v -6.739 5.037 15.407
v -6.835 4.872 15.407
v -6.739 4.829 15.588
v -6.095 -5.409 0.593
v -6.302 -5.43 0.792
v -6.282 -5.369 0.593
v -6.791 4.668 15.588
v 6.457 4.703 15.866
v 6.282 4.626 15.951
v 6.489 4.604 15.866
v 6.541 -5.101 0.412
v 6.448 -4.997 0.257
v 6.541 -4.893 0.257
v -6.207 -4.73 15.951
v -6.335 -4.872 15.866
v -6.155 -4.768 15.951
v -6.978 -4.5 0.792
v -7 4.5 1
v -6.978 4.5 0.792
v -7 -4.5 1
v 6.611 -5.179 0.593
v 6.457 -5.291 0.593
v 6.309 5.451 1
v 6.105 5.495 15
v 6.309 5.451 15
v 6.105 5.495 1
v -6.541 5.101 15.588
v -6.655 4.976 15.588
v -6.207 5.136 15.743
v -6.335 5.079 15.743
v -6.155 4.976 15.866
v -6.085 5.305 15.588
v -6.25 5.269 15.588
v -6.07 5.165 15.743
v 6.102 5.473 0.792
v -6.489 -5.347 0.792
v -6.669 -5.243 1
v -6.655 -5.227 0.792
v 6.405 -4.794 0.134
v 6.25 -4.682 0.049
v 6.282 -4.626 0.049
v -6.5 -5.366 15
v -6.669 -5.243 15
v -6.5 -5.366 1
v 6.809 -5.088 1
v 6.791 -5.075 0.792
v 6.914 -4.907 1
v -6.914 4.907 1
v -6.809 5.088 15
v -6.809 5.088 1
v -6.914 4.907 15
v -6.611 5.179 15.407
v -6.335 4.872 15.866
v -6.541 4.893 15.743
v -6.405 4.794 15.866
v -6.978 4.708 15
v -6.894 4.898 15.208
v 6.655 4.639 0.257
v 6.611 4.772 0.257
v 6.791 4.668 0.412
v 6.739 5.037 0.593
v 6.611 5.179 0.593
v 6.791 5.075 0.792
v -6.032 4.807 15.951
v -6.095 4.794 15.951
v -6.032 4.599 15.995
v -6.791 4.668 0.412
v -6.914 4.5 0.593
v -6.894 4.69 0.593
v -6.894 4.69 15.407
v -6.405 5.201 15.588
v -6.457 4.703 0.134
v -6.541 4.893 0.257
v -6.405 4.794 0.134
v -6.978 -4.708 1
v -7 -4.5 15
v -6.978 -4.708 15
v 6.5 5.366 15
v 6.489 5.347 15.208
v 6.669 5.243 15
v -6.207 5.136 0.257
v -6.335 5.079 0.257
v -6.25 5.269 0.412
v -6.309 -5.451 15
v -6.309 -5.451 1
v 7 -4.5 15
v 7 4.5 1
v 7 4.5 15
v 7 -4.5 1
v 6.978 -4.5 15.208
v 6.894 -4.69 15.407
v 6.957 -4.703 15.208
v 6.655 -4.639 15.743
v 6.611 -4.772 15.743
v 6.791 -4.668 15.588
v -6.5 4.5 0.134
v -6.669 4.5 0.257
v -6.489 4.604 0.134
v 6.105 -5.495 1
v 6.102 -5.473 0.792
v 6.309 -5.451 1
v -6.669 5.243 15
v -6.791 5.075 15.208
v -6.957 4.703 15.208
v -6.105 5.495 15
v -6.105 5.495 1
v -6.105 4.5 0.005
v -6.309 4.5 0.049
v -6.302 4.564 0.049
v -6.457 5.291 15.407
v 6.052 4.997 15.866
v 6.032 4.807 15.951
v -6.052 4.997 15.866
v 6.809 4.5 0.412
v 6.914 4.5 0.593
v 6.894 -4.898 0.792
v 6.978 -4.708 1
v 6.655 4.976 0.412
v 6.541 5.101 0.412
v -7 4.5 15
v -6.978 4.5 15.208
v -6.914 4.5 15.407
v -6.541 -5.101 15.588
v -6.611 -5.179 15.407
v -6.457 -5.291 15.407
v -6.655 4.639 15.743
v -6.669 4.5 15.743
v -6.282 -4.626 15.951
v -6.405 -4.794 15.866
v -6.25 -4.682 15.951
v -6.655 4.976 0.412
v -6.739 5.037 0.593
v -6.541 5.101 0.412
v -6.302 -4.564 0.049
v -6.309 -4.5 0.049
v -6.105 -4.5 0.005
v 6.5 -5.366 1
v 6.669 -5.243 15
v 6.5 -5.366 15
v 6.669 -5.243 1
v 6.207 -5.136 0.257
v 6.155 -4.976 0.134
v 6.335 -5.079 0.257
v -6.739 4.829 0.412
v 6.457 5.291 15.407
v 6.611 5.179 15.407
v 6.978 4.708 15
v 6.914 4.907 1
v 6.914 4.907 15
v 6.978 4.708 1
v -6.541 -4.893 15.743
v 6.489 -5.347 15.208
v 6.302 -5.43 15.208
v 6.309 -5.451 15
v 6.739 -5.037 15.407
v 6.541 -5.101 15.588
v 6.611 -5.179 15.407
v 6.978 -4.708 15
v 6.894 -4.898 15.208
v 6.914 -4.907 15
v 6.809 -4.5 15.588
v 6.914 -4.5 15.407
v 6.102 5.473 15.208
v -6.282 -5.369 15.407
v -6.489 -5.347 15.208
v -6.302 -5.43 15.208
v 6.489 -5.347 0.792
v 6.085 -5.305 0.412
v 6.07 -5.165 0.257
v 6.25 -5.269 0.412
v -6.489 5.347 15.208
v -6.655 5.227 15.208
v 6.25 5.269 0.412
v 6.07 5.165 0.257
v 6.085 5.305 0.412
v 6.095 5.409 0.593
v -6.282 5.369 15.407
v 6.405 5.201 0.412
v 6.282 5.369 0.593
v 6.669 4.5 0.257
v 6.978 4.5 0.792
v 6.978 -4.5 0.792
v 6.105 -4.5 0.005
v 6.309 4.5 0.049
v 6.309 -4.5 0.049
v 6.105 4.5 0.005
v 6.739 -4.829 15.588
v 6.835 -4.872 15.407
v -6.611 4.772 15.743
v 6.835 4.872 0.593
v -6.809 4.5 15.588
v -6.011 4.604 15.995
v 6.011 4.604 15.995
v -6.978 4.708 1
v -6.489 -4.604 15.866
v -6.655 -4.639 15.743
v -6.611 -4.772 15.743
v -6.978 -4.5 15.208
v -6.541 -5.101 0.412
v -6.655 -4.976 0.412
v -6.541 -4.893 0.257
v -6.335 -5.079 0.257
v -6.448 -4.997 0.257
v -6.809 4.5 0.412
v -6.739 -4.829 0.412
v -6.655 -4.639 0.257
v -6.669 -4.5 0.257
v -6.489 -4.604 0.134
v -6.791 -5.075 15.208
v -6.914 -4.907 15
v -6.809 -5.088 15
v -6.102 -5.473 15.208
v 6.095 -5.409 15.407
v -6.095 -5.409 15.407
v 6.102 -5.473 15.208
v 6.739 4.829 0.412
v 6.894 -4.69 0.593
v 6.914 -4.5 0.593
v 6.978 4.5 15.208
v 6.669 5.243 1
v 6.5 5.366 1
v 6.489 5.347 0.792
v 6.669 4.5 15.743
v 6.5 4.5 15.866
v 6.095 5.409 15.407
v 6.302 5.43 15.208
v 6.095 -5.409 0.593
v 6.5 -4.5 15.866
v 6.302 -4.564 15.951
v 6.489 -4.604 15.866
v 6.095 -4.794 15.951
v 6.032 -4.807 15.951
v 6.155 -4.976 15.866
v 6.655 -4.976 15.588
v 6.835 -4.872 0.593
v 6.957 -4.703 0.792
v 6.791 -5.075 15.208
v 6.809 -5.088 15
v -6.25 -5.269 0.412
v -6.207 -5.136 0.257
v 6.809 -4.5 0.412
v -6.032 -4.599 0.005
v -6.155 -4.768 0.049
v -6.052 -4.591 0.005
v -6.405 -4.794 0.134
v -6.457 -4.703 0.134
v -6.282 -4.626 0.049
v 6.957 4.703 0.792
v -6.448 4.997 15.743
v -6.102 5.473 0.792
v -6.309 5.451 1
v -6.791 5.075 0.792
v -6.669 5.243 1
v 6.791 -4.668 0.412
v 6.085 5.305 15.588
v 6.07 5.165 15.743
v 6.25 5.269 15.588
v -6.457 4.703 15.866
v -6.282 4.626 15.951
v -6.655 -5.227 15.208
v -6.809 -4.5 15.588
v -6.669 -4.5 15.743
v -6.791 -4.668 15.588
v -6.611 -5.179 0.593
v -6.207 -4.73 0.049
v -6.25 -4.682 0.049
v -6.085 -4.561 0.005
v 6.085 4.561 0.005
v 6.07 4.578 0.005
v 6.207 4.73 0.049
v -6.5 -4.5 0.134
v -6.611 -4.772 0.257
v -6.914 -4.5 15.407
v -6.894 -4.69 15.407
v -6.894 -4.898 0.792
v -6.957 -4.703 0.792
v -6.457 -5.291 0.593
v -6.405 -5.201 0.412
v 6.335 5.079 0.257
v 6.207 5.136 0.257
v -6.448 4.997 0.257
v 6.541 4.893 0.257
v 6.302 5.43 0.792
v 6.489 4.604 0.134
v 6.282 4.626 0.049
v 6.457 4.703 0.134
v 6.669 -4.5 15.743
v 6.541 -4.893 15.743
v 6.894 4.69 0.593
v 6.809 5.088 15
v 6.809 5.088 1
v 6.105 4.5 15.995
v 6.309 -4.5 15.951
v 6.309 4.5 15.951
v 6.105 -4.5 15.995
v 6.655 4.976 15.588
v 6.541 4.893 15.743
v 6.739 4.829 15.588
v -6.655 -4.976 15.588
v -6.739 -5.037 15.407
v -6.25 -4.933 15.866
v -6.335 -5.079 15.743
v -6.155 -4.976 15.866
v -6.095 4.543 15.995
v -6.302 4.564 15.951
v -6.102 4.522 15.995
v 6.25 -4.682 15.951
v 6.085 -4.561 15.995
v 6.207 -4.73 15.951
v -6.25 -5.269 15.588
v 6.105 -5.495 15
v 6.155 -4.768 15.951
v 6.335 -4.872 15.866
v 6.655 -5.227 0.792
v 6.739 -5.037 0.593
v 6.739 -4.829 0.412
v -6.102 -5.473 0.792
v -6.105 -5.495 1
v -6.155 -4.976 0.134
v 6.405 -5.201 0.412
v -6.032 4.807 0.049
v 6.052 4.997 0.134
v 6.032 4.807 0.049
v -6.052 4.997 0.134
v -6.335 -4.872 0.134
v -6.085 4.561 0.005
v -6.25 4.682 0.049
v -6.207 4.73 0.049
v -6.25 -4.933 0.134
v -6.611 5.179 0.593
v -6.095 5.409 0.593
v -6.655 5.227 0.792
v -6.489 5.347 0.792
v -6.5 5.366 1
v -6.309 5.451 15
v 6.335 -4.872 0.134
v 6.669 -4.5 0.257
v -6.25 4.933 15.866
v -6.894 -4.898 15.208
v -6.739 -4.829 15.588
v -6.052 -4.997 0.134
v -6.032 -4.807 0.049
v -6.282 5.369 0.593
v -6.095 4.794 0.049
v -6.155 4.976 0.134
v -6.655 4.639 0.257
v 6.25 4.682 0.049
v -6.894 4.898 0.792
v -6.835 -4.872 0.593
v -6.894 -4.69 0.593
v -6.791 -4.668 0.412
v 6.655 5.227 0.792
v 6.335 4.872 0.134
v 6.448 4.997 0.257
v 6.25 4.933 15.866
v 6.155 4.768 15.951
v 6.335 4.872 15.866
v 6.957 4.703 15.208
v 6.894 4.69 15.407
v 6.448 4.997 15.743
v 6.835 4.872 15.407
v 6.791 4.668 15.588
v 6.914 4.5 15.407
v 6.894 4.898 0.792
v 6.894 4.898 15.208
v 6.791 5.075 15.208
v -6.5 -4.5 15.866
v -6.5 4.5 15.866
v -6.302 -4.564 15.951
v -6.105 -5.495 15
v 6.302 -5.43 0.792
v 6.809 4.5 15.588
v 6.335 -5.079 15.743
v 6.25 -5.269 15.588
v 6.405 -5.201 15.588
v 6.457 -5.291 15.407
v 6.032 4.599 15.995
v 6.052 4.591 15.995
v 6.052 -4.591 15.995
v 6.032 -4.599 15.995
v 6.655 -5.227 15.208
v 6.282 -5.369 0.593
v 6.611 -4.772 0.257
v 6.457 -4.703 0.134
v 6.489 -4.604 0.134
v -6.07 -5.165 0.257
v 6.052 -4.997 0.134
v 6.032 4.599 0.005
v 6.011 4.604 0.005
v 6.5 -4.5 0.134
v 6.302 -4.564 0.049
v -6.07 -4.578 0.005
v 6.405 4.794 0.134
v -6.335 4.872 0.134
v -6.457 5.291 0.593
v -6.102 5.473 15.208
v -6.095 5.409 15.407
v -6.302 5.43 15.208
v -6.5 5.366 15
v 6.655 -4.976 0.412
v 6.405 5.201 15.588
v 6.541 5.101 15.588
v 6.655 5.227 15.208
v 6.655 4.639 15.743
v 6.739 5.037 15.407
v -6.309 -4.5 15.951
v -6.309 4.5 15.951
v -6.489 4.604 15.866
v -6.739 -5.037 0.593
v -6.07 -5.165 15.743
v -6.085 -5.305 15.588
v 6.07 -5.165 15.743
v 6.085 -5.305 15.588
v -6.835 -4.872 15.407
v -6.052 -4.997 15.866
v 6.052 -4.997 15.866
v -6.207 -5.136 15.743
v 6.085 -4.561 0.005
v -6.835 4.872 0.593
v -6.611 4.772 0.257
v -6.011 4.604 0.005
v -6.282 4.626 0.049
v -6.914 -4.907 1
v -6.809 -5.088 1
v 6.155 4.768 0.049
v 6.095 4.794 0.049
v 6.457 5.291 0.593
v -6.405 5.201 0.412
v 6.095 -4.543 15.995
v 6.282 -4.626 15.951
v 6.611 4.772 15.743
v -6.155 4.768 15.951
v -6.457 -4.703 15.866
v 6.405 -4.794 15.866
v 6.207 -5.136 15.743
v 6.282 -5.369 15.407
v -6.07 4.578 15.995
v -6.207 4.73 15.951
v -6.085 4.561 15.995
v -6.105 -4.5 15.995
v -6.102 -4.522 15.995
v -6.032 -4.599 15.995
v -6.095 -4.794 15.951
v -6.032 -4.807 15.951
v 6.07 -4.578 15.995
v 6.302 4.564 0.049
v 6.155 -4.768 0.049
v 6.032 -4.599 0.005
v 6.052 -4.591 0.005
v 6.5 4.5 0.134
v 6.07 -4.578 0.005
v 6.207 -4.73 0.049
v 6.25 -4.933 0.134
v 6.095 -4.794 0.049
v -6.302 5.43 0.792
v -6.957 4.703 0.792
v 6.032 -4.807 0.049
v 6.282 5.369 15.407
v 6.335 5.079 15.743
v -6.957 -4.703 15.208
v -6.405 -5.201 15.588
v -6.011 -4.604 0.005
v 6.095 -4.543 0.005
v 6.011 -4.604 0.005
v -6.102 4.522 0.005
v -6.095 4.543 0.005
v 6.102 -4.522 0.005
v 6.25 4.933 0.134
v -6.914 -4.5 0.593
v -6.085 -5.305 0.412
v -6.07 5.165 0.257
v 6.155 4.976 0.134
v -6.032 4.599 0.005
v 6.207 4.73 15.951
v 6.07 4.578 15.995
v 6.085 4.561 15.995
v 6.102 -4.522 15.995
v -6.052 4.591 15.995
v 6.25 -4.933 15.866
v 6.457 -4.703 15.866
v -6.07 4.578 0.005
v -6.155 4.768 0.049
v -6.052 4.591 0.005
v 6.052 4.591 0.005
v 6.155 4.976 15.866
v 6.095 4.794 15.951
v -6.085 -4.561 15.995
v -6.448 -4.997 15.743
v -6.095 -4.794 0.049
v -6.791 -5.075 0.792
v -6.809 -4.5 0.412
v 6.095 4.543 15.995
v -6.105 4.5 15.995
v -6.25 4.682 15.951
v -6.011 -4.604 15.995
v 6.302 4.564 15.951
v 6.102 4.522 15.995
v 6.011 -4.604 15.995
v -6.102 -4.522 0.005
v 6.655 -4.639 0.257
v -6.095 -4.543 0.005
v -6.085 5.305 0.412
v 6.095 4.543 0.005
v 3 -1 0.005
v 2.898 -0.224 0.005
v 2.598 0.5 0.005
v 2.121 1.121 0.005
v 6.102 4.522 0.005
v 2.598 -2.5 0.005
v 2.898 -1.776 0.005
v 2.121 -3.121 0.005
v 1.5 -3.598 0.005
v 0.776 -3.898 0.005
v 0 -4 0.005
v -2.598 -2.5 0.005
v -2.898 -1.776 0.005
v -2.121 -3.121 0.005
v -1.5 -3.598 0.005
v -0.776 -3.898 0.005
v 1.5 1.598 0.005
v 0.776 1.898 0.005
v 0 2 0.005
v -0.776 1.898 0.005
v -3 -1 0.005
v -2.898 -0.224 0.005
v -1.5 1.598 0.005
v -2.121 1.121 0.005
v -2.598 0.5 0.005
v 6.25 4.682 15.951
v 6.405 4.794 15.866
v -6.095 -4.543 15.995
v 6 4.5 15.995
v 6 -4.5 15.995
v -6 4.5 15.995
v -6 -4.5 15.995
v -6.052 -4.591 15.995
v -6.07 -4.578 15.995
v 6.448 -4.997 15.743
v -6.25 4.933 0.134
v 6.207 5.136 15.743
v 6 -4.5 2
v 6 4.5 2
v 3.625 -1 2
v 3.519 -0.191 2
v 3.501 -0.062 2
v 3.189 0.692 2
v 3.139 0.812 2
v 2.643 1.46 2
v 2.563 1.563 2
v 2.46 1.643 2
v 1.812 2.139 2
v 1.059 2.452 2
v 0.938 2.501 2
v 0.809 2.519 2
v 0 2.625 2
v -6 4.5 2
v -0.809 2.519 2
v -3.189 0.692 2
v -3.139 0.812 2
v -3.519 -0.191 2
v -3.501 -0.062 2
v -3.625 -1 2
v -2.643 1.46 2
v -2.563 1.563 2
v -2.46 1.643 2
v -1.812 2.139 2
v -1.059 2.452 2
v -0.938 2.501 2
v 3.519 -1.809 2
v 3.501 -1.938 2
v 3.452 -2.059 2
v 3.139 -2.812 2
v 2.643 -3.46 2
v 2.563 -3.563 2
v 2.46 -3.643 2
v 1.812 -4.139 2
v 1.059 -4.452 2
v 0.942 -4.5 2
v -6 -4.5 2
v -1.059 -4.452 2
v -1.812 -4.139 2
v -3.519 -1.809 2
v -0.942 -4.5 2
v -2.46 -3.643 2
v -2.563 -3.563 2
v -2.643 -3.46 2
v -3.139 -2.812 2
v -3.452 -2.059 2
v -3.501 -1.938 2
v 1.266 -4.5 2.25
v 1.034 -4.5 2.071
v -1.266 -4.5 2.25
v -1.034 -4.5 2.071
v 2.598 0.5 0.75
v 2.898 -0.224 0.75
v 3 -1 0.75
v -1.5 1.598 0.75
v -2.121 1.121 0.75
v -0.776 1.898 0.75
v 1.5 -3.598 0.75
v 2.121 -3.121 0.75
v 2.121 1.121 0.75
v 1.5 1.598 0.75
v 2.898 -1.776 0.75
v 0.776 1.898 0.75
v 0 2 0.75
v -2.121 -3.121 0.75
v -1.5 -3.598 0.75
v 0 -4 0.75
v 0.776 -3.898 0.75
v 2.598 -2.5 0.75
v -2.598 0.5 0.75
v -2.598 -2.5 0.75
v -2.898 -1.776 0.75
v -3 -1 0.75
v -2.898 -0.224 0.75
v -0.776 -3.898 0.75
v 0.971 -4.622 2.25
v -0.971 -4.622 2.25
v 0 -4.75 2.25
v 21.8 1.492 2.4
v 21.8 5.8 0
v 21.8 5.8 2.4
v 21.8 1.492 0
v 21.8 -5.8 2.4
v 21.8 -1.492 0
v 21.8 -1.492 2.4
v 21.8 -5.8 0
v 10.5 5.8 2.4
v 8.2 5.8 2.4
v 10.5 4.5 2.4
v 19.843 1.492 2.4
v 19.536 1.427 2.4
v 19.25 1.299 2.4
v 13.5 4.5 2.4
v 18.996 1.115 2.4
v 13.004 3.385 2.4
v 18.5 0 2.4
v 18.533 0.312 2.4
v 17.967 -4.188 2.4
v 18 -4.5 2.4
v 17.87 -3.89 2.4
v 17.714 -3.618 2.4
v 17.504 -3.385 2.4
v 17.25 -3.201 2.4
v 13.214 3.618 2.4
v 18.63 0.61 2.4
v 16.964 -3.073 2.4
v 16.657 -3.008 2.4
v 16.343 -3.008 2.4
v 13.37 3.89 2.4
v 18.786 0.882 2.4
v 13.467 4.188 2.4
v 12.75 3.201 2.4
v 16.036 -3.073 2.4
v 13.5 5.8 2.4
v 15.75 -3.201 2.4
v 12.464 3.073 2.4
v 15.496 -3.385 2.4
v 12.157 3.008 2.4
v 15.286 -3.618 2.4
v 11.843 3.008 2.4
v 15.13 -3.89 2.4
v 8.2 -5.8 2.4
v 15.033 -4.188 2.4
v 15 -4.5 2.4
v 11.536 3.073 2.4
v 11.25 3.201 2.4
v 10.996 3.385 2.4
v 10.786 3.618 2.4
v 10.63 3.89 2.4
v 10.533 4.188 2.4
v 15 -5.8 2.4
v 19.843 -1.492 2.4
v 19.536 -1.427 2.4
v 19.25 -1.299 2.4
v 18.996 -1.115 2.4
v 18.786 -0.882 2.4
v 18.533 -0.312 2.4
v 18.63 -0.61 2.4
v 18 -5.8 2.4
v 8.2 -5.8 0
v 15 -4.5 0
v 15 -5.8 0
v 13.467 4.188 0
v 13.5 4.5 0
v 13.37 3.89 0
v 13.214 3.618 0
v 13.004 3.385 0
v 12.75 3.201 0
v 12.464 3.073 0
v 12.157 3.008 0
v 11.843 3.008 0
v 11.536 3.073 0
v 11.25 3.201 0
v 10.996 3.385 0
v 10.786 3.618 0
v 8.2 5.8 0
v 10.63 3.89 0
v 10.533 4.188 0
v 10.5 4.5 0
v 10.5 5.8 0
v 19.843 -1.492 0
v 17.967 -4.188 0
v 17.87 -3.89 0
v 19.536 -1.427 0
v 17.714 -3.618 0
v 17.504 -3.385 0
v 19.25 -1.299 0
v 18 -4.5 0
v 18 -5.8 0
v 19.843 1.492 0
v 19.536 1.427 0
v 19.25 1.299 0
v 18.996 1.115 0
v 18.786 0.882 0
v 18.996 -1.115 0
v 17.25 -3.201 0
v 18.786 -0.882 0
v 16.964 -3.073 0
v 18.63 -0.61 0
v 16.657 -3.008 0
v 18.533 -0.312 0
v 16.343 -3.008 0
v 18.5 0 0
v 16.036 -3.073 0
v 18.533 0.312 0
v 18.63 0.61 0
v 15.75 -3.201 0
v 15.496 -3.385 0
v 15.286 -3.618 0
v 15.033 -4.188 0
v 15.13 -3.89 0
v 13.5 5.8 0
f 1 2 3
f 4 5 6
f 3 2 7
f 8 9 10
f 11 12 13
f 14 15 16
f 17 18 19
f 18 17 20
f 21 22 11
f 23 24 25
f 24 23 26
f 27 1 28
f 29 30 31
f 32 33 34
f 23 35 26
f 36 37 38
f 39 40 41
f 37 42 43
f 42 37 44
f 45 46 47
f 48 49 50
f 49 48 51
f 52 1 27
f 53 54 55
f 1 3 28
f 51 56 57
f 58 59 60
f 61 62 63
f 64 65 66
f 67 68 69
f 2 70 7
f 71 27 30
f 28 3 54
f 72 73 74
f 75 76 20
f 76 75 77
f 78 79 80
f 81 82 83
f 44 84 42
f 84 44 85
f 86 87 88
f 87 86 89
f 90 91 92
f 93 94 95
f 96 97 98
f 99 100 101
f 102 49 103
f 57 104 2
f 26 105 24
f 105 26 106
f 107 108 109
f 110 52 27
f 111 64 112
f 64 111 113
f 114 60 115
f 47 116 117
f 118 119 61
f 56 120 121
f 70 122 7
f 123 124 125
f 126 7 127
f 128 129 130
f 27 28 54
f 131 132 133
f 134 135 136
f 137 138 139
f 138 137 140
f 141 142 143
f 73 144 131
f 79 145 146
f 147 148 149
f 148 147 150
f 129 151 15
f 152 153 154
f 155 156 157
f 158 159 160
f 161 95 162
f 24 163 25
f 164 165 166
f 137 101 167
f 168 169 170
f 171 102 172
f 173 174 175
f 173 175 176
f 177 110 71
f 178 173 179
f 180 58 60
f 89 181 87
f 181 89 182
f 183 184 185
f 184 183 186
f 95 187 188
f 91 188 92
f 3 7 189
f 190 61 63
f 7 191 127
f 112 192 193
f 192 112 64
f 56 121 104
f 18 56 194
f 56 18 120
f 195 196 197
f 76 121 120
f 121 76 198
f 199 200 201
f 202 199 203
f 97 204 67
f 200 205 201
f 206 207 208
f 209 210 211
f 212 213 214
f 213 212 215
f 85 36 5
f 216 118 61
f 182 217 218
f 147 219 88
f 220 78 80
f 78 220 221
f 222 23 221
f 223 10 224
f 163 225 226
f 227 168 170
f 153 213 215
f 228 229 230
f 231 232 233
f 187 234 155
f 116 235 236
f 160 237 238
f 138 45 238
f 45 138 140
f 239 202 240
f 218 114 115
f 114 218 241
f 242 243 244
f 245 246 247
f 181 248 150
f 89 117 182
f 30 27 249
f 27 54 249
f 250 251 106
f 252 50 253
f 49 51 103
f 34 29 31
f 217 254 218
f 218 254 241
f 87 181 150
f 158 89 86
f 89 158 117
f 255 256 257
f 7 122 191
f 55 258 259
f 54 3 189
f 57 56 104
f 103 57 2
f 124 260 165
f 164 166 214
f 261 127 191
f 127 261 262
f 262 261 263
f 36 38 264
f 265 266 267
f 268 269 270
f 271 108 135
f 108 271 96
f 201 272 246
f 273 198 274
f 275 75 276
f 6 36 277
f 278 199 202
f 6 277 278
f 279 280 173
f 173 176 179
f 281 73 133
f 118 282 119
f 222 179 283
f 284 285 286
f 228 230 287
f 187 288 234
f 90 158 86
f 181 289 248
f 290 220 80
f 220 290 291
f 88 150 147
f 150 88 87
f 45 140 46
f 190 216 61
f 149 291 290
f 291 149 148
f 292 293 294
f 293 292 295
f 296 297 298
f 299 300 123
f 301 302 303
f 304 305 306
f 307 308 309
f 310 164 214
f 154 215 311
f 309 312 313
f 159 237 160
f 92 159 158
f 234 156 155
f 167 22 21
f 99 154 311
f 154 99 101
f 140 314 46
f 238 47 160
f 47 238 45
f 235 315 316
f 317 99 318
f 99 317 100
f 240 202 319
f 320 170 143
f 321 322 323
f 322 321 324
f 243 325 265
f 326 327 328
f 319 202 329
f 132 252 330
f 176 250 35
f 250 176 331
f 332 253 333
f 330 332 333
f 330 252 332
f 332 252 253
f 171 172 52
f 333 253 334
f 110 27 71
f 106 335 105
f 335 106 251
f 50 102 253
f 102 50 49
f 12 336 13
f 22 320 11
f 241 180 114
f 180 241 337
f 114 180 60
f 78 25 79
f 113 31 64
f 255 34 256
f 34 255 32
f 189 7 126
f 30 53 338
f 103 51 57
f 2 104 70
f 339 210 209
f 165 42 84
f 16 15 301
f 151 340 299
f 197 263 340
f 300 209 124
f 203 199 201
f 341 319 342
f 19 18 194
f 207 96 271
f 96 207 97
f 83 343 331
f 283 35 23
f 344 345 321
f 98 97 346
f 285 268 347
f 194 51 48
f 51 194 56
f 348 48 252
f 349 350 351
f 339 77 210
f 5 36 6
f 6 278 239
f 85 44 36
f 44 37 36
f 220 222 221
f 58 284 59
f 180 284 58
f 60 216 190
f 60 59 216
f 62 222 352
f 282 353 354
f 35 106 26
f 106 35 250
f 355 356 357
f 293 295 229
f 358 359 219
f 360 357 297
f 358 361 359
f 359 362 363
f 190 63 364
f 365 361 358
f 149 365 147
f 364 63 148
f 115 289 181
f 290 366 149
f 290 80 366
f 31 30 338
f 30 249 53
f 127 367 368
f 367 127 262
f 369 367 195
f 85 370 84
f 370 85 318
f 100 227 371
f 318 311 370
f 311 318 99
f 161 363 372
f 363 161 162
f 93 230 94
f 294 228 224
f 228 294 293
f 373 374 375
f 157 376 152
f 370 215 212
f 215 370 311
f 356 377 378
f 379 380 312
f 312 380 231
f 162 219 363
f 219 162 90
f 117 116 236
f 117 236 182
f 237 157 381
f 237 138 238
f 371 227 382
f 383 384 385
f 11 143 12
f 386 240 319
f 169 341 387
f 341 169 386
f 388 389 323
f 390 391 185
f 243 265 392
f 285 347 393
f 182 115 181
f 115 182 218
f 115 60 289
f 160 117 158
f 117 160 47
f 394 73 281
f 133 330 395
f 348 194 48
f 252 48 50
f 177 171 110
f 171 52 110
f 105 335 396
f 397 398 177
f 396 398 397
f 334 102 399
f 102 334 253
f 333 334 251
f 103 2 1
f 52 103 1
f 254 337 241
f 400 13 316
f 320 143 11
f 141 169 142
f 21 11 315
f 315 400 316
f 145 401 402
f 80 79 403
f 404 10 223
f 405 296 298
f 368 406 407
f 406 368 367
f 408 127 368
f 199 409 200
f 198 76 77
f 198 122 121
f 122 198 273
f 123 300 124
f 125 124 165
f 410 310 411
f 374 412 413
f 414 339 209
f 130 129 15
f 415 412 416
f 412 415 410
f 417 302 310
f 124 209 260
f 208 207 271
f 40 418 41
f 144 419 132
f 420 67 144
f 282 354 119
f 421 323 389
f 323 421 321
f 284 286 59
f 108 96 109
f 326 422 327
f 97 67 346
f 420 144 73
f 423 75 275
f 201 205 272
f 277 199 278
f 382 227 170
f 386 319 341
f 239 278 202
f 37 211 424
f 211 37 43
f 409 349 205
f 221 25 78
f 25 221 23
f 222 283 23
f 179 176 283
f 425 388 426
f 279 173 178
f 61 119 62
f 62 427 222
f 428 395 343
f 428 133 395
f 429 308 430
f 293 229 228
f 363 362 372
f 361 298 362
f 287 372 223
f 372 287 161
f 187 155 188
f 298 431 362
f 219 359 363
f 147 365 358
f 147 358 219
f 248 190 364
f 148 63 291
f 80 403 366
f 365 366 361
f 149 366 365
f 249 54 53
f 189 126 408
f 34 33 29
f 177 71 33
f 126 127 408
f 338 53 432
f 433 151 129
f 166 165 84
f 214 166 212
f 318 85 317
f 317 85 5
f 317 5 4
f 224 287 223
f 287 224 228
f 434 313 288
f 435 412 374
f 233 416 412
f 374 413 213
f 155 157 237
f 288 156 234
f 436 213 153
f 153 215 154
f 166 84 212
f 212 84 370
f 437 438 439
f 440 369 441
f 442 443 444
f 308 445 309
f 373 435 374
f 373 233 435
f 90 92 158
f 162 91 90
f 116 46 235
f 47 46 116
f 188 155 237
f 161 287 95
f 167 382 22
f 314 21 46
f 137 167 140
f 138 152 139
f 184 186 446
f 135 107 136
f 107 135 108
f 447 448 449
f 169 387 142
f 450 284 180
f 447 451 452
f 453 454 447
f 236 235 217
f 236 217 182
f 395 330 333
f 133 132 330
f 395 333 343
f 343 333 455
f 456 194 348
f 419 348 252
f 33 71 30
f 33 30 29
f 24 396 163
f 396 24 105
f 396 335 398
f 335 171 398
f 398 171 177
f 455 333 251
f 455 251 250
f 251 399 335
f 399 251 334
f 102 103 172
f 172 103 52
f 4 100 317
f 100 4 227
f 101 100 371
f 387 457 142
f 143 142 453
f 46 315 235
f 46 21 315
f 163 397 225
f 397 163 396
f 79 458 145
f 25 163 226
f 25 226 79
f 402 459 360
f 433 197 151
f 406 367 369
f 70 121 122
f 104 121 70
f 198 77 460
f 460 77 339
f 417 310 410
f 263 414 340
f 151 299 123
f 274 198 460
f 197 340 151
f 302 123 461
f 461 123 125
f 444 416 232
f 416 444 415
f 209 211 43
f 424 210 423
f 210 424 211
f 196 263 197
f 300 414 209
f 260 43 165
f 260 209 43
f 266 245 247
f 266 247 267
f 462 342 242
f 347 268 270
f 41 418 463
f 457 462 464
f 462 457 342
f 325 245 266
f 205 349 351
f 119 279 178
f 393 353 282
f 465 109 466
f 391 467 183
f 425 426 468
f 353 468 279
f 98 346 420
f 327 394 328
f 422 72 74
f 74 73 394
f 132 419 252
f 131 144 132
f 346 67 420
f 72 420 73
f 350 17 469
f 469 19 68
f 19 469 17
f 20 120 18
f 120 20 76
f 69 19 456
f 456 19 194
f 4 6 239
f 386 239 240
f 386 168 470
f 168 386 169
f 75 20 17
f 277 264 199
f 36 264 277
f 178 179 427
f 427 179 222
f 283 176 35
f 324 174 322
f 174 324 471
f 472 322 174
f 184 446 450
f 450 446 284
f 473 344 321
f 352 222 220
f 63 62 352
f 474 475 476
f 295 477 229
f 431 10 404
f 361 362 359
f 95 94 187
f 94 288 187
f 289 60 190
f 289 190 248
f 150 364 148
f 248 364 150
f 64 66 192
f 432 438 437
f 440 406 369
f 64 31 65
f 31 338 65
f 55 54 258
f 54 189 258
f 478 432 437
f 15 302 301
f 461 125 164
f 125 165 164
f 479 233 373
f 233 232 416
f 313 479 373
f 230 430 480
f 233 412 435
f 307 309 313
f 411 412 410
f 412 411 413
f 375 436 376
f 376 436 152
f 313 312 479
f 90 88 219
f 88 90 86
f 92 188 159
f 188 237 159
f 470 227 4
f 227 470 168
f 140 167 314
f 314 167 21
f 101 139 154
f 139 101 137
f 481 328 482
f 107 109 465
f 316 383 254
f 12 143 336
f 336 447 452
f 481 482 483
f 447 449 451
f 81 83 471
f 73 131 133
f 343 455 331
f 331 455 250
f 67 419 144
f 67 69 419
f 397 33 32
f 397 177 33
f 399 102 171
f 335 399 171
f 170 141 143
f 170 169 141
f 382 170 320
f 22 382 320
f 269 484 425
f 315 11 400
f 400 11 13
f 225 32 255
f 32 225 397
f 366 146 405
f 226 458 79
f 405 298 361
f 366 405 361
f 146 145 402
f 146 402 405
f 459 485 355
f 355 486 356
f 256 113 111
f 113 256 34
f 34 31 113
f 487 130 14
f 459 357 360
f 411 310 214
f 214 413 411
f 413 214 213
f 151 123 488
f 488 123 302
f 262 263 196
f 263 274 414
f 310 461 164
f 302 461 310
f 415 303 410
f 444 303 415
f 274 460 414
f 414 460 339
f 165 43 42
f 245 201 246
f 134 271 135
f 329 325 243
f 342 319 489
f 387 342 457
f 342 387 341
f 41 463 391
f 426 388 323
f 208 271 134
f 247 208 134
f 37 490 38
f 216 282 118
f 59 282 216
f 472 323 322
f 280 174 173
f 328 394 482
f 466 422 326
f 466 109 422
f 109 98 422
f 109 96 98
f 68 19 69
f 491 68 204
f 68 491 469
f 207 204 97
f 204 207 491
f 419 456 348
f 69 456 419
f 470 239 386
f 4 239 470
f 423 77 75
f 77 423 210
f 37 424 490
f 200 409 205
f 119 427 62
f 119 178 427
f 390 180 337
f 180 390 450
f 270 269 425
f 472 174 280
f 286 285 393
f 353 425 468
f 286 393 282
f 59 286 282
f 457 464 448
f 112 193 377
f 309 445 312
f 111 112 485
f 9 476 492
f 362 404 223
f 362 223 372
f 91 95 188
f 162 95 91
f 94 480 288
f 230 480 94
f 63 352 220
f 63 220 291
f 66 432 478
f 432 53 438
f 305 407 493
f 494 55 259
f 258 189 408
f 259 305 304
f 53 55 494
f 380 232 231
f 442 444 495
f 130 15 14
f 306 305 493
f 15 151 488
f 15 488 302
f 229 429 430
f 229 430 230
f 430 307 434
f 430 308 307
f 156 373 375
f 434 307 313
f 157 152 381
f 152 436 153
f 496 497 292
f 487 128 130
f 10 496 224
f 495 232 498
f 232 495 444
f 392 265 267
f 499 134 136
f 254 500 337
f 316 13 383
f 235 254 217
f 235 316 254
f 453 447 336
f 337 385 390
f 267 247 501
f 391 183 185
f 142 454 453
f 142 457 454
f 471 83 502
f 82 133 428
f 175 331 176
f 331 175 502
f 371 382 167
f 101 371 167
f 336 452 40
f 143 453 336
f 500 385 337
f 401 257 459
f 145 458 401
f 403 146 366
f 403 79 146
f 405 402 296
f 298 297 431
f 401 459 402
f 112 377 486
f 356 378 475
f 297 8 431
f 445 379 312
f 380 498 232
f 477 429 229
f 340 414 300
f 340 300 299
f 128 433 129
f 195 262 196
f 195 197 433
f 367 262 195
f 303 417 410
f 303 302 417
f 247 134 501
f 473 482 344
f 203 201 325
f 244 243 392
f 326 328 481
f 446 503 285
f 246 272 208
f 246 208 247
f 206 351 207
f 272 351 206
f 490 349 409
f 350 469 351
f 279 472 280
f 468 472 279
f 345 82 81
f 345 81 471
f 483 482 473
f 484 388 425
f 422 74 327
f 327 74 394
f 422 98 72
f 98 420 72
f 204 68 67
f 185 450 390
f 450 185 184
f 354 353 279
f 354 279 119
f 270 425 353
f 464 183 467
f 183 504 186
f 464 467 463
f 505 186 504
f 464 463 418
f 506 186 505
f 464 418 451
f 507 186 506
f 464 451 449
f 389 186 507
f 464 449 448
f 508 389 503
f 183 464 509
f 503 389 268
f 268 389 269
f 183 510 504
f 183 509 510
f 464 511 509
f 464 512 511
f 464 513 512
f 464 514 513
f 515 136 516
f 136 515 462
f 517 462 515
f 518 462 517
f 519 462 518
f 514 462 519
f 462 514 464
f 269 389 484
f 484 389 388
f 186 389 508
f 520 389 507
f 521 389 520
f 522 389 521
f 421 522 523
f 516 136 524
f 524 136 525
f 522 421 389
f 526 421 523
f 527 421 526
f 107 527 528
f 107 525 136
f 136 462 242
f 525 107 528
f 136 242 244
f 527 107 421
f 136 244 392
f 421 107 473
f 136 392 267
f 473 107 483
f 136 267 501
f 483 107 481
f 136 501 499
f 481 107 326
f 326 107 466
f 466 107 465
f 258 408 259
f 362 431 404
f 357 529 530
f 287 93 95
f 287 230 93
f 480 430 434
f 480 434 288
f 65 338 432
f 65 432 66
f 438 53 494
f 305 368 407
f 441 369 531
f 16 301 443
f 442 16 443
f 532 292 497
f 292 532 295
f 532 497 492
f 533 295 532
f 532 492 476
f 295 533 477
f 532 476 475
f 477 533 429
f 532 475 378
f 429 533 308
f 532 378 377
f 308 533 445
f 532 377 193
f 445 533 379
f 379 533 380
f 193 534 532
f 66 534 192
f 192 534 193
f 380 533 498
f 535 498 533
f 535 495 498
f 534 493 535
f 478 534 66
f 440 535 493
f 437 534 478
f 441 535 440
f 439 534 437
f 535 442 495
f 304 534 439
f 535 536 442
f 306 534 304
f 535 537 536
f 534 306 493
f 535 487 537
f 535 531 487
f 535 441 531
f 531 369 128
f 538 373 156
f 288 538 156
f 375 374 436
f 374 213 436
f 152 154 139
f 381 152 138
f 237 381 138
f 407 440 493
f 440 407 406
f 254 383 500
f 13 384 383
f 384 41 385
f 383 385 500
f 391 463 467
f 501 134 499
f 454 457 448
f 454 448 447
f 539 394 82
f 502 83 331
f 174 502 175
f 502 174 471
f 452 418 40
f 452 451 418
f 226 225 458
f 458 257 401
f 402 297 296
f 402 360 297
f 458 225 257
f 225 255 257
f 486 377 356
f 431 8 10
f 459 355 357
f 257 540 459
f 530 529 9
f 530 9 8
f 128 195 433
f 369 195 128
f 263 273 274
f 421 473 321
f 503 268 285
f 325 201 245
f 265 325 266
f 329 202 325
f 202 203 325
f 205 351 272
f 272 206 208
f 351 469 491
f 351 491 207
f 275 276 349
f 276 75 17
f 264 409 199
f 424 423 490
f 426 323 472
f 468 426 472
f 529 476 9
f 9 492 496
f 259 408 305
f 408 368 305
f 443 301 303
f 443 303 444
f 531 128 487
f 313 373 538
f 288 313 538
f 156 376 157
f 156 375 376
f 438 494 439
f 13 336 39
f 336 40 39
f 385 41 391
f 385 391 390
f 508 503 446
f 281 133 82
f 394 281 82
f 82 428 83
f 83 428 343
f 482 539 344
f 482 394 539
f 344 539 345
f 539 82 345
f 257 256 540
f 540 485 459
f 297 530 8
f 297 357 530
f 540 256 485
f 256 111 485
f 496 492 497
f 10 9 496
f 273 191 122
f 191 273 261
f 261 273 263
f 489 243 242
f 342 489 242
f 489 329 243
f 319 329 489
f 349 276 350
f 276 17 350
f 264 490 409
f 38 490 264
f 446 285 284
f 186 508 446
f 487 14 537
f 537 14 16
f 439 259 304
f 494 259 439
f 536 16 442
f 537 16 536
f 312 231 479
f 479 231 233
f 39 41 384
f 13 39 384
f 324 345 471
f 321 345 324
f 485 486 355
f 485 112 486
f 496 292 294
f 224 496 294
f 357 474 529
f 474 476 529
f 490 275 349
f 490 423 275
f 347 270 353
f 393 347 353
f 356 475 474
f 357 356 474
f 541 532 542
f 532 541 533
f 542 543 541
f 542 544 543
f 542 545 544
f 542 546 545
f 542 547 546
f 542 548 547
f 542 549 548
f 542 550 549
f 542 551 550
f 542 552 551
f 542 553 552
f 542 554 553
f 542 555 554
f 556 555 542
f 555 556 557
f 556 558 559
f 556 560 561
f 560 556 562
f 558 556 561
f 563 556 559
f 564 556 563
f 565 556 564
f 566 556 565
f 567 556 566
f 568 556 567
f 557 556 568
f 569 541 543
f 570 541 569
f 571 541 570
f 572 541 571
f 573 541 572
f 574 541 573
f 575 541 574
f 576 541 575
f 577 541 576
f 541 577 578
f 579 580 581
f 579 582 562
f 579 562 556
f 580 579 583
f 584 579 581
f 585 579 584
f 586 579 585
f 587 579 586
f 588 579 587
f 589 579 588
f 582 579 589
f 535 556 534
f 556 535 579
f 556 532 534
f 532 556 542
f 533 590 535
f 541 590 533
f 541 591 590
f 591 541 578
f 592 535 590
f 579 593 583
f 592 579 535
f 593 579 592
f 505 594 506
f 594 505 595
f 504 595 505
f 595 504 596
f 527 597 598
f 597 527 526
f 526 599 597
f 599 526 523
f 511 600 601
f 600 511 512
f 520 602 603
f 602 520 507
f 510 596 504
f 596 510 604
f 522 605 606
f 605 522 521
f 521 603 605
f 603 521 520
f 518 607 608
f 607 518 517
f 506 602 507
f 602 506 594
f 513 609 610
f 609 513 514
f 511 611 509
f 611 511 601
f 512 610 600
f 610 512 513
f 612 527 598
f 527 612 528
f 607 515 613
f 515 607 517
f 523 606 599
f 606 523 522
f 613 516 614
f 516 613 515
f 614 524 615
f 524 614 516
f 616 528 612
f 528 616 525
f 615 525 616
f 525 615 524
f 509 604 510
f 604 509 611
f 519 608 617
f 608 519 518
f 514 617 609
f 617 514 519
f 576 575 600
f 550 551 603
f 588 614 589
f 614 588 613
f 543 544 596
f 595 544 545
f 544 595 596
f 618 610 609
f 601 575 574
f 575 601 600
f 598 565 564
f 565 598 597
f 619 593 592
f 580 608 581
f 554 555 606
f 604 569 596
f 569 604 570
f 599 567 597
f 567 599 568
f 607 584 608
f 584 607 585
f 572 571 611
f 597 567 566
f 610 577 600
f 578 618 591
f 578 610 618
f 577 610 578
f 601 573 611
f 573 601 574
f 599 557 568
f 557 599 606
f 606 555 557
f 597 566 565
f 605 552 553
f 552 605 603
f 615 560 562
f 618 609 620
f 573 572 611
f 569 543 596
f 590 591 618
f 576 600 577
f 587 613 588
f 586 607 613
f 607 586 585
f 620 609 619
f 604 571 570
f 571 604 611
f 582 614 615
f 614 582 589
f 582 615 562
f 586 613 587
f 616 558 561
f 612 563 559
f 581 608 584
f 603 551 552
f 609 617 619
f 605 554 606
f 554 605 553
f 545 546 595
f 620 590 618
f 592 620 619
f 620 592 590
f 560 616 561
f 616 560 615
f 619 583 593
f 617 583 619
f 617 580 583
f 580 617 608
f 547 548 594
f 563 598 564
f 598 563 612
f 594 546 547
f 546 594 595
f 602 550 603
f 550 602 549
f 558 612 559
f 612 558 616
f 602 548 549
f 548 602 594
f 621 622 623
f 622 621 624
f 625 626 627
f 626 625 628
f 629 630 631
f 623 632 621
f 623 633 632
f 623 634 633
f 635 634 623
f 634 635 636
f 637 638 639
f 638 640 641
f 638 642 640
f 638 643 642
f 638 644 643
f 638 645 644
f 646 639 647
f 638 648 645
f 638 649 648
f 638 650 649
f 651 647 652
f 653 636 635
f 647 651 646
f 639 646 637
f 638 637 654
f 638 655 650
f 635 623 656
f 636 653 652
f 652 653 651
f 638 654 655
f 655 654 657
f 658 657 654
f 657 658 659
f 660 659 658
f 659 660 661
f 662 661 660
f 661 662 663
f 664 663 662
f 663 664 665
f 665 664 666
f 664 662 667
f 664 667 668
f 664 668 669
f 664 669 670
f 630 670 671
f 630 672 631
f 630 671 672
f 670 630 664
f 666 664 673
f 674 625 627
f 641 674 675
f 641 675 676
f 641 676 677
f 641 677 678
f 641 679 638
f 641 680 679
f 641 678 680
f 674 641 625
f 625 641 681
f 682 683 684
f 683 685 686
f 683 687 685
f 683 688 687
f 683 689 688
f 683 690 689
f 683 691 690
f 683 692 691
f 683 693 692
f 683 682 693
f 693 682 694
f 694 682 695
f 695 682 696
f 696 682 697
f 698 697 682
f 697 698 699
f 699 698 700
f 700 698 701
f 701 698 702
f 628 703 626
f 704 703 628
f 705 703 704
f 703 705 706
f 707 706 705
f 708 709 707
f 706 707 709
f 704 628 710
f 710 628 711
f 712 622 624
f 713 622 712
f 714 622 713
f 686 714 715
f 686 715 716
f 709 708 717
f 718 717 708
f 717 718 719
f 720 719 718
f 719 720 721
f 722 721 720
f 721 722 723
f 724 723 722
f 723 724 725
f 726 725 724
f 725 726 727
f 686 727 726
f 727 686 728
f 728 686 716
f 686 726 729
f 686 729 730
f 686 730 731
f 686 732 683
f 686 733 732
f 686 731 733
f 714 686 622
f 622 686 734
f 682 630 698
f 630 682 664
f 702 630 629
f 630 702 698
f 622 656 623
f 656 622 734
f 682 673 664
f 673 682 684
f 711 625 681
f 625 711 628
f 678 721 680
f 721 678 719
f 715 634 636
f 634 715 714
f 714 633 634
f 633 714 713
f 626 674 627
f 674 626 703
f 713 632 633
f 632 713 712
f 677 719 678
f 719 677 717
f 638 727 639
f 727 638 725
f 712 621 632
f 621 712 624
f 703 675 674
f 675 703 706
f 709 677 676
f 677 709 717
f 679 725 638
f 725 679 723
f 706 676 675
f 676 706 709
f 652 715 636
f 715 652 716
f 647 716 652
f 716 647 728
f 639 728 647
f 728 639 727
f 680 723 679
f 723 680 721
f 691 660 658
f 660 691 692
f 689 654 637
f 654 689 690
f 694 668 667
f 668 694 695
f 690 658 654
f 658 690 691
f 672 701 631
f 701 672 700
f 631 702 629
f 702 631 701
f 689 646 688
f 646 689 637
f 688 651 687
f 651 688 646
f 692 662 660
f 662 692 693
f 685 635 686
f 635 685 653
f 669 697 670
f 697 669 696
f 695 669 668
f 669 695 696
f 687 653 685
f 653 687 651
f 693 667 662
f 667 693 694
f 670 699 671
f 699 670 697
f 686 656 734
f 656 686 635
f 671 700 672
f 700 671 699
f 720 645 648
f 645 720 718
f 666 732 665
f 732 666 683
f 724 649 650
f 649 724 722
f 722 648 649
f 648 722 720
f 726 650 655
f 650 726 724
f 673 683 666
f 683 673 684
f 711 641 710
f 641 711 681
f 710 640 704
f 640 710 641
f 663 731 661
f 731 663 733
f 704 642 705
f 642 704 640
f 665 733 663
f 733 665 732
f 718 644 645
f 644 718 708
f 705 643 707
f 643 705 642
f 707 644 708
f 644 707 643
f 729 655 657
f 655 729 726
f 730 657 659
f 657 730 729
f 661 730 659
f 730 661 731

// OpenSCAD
 $fn=30;
jackBox();
translate ([15,0,0])jackSabot();



//******************************* SUBROUTINES **********************************

module jackBox(){
translate ([0,0,16/2])difference(){
roundedCube (14,11,16,1);
translate ([0,0,1]) cube([14-2,11-2,16-2], center = true); //remove jack area
translate ([0,-1.0,-16/2])cylinder(d=6,h=3,$fn=24);	 //main jack bore

translate ([0,-1.0,-6.5])cylinder(d1=6,d2=7.5,h=1.5,center = true,$fn=24);	 //jack thread EZ find bevel
}


}//module

module jackSabot(){
translate ([0,0,2.4/2])difference(){
cube([14-.4,12-.4,2.4], center = true);
    hull() { //jack end slot
    translate ([5,0,1])cylinder(d=3,h=8, center = true);//jack end hole
    translate ([5+3,0,1])cylinder(d=3,h=8, center = true);
}//
	
   hull() { //strip end slot
    translate ([-3,4.5,1])cylinder(d=3,h=8, center = true); //strip end hole
    translate ([-3,4+3.5,1])cylinder(d=3,h=8, center = true); //strip end hole
}//

 
  hull() { //middle slot
    translate ([1.5,-4.5,1])cylinder(d=3,h=8, center = true);//middle hole
    translate ([1.5,-4.5-3,1])cylinder(d=3,h=8, center = true);//middle hole
}//
 
}//difference
}//module 


module roundedCube (myBoxWidth,myBoxDepth,myBoxHeight,minkRadius)
//** By Derrick Andrews Same as regular cube, but with rounded sides and bottom
//** maintains proper 'cube' dimensions due to compensation for object expansion 
//** that normally occurs while using Minkowski operations in OpenSCAD)
{
union()
{

minkowski(){
cube([myBoxWidth-minkRadius*2,myBoxDepth-minkRadius*2,myBoxHeight-minkRadius*2], center = true);//Main plate   original cube([90,testSize8,8.5]
sphere(r=minkRadius,$fn=30);
}  //end mink


}//end union
}//end module roundedCube
